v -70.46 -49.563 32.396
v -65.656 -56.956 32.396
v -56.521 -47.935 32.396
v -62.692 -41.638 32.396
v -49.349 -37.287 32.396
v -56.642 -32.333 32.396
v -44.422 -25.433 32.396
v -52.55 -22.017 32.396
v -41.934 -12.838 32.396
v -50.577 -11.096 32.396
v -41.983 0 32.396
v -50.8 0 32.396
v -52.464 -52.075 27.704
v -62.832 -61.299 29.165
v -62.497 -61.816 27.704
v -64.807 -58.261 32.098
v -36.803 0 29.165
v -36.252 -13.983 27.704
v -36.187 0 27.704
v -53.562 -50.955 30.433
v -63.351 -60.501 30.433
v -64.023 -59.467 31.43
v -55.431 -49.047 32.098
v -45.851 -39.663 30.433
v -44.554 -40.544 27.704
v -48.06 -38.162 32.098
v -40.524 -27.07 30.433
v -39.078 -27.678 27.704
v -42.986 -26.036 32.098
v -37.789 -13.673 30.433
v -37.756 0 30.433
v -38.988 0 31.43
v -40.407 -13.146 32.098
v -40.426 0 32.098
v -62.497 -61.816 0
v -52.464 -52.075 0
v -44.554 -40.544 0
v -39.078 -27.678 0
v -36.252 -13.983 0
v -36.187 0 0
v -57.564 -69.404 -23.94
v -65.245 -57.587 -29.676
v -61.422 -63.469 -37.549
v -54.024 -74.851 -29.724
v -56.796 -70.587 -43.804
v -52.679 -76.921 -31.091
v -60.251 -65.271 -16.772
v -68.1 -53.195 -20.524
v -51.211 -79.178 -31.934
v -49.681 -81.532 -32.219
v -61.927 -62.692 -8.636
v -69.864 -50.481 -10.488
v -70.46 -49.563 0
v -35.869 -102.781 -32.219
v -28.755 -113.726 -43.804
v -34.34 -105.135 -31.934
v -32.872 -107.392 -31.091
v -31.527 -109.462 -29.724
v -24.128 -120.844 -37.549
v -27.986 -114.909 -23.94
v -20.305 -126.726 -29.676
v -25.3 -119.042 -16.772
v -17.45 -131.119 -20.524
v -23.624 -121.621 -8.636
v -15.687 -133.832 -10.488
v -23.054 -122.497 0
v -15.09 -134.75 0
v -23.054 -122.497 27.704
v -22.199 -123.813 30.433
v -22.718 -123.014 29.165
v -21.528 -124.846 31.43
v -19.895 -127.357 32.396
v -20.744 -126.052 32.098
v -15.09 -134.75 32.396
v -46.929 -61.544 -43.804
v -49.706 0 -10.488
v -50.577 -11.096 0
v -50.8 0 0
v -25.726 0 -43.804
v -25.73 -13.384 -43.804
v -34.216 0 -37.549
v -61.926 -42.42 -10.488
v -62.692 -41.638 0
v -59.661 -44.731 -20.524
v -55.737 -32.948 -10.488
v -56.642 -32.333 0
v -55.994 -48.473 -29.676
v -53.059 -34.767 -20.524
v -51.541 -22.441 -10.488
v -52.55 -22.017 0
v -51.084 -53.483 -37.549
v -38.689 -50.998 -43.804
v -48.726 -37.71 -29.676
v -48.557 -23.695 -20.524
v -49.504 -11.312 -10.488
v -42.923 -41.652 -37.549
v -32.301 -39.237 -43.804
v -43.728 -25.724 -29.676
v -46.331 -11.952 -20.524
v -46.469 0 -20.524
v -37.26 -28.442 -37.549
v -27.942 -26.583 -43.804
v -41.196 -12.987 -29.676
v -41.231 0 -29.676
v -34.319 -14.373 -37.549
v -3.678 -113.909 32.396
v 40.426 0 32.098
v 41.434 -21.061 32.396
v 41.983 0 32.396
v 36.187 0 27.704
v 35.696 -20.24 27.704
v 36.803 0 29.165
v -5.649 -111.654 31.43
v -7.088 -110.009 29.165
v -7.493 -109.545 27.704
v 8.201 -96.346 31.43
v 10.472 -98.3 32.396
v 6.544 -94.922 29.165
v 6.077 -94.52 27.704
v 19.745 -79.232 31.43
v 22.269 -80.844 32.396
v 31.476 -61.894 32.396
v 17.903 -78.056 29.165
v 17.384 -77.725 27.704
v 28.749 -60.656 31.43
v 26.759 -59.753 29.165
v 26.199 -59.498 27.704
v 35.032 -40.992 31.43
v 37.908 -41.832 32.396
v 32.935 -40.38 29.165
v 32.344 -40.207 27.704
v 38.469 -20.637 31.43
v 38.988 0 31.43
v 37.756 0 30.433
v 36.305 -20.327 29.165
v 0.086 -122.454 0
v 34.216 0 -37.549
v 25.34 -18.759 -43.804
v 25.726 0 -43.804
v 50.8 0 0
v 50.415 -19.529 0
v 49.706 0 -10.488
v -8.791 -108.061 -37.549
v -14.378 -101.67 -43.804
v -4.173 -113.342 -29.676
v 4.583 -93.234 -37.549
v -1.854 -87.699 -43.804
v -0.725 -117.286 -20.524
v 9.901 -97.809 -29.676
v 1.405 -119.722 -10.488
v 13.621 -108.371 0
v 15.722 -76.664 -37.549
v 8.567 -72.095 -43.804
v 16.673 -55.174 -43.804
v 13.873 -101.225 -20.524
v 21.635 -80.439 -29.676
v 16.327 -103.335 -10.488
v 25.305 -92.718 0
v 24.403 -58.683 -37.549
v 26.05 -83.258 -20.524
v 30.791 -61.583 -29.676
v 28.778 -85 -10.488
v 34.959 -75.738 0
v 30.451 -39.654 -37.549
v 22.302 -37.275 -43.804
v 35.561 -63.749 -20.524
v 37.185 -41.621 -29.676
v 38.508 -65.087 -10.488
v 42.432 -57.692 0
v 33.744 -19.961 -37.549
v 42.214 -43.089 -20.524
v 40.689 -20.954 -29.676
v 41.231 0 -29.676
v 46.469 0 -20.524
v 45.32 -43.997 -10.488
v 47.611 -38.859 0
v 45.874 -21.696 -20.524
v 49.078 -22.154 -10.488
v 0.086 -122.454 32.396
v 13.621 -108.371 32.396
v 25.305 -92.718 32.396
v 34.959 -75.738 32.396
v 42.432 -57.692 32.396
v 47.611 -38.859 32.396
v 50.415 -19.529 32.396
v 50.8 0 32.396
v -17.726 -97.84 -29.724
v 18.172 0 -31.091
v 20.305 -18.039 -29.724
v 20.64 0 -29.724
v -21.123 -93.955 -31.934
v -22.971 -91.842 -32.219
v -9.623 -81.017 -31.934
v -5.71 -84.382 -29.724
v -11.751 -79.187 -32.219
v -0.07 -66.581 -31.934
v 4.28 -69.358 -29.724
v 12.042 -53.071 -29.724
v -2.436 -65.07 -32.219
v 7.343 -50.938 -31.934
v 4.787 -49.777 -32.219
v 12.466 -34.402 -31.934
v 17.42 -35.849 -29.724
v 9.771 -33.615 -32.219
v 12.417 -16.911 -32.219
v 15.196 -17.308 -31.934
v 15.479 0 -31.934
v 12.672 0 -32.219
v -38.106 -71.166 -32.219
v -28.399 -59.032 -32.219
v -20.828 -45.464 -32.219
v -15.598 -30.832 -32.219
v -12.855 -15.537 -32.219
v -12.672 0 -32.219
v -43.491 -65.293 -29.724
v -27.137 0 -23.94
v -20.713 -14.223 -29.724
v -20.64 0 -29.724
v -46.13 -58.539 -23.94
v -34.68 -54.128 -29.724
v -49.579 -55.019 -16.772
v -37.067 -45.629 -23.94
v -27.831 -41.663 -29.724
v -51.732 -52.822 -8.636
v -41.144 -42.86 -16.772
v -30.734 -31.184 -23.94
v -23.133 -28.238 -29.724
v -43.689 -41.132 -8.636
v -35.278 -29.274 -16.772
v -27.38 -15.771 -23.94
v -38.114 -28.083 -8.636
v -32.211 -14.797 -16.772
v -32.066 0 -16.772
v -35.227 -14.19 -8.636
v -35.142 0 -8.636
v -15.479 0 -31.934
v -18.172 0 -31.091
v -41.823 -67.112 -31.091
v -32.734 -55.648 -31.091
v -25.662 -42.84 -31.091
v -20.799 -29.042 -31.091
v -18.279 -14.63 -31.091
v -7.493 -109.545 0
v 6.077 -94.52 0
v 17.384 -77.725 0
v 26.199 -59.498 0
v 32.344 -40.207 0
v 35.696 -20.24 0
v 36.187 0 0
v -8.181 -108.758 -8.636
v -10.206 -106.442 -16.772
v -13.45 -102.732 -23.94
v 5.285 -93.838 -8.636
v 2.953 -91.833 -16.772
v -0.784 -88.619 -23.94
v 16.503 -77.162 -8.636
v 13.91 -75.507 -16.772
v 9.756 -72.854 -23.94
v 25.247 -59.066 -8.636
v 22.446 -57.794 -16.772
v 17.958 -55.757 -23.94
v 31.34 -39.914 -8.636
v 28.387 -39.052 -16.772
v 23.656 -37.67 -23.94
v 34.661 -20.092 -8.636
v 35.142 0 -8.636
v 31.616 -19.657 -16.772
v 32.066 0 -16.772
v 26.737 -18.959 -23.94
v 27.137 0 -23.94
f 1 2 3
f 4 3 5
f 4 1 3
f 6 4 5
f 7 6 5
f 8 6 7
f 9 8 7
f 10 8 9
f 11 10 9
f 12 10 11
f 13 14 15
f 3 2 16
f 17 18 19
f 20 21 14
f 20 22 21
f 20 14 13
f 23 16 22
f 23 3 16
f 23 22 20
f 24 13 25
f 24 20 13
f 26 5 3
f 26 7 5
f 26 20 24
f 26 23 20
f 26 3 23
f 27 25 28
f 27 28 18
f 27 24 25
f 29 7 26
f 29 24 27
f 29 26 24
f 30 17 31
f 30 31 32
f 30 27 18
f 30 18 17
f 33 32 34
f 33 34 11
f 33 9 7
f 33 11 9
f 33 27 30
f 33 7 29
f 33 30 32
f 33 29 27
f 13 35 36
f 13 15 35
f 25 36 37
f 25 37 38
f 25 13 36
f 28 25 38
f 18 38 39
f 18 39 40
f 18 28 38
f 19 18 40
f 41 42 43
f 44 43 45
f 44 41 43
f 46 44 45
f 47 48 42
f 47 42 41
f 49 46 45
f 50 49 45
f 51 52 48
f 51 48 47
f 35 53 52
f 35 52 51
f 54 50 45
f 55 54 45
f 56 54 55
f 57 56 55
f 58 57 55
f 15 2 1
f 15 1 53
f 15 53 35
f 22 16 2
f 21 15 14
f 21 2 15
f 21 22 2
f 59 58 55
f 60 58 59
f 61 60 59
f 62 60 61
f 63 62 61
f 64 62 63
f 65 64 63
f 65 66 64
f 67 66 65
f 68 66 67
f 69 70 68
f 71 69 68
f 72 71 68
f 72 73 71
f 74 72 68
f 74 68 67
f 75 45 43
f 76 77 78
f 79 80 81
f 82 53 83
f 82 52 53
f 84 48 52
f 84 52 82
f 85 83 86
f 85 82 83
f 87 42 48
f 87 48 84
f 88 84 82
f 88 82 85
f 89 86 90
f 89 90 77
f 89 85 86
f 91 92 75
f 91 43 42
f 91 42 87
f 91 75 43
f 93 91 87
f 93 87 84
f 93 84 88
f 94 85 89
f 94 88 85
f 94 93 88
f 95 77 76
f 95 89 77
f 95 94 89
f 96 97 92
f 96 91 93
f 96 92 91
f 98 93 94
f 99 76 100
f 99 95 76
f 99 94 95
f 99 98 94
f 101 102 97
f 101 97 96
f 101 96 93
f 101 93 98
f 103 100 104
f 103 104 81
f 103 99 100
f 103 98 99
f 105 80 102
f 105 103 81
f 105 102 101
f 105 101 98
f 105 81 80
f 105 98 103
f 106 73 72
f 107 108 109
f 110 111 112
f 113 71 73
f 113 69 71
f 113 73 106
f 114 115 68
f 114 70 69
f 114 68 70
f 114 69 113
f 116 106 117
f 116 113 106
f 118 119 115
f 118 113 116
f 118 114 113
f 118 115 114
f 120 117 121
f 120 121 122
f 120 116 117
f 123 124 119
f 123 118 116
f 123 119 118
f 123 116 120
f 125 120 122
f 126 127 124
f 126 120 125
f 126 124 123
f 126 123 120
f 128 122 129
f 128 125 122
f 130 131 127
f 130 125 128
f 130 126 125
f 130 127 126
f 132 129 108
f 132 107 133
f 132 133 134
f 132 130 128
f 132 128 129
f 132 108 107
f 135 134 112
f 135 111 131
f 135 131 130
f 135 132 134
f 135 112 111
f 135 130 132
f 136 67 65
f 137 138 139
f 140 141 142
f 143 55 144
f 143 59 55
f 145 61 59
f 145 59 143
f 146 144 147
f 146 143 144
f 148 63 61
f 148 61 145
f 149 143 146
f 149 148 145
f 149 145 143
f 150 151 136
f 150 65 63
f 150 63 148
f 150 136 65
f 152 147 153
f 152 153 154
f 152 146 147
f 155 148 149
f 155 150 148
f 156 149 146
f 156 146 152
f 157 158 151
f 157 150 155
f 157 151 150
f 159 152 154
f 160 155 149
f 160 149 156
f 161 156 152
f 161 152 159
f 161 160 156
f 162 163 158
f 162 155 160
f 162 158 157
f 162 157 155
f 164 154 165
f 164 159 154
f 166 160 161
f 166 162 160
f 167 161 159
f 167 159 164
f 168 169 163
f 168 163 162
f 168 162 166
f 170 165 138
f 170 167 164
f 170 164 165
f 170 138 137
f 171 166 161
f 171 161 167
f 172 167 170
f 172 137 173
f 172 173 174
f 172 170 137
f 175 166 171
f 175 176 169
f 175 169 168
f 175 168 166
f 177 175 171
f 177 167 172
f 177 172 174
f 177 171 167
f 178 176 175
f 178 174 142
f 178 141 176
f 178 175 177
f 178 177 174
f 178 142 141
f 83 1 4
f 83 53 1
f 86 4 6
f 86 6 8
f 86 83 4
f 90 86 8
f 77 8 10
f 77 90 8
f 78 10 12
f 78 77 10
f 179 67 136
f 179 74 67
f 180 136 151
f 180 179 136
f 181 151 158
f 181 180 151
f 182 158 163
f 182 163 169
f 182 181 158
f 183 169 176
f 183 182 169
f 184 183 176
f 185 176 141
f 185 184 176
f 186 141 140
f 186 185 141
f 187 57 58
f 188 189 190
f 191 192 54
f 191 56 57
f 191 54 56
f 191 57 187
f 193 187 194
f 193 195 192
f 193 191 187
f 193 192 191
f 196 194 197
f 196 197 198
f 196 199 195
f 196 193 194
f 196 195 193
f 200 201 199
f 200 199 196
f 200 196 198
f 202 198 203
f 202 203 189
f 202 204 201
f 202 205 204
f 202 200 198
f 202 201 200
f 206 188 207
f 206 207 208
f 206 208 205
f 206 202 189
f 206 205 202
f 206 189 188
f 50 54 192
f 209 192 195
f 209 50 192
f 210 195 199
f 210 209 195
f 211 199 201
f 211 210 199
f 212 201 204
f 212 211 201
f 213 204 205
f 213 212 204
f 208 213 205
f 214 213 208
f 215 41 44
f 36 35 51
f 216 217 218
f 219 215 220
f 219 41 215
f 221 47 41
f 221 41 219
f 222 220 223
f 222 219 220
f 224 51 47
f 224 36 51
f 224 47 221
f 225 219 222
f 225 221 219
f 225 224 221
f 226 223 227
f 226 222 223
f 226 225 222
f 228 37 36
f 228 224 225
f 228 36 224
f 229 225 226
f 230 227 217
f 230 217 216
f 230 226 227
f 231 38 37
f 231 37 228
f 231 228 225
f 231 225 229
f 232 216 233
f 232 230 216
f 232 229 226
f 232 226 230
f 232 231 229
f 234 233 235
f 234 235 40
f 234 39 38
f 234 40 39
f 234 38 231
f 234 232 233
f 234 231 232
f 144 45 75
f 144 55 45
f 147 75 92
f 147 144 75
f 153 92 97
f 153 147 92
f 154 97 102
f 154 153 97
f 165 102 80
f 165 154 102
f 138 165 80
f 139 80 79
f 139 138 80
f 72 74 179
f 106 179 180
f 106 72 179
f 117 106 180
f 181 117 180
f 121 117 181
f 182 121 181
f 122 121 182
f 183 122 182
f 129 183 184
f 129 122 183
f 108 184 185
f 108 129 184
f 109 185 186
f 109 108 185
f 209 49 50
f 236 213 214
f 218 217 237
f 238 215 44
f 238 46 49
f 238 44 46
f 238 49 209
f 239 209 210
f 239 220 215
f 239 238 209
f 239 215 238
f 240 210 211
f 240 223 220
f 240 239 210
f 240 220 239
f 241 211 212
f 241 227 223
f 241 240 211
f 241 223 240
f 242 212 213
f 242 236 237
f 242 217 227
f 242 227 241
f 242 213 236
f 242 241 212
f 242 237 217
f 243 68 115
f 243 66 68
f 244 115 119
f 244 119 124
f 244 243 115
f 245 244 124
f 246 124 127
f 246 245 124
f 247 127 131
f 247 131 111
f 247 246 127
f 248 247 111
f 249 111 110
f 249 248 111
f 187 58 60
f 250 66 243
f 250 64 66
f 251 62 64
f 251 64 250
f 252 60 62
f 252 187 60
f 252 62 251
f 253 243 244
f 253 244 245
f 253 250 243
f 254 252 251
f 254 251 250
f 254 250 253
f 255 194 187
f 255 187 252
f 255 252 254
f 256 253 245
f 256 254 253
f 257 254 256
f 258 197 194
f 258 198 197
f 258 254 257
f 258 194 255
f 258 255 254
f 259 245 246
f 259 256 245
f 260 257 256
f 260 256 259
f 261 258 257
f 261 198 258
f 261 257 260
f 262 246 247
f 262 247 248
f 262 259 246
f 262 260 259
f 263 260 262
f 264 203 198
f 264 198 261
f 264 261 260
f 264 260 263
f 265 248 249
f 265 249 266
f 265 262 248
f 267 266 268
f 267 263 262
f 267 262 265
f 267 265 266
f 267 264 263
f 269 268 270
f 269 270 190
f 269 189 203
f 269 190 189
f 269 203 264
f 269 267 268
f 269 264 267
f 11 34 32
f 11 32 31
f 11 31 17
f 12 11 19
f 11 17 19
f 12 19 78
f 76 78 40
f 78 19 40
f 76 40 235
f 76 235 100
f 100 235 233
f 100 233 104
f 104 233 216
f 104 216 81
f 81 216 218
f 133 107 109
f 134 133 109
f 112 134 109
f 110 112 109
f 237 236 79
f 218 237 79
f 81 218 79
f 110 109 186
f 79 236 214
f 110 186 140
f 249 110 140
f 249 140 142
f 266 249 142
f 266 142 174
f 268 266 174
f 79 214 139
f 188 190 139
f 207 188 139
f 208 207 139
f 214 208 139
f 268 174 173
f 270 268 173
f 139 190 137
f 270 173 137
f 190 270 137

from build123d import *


with BuildPart() as f2:
    # F2: sweep along a path in F1
    with BuildLine(Plane.XY) as f2_path:
        ThreePointArc((-42.775339, -92.156554), (-9.690307, -51.507719), (0, 0))
    # F0 (on Front) → F2 (sweep)
    with BuildSketch(Plane.XZ):
        with BuildLine():
            ThreePointArc((-20.63977, -29.72378), (-32.065525, -16.772159), (-36.187058, 0))
            Line((-36.187058, 0), (-36.187058, 27.704396))
            ThreePointArc((-36.187058, 27.704396), (-38.341088, 30.969492), (-41.983402, 32.395763))
            Line((-41.983402, 32.395763), (-50.8, 32.395763))
            Line((-50.8, 32.395763), (-50.8, 0))
            ThreePointArc((-50.8, 0), (-44.088108, -25.236456), (-25.726035, -43.804237))
            Line((-25.726035, -43.804237), (0, -43.804237))
            Line((0, -43.804237), (25.726035, -43.804237))
            ThreePointArc((25.726035, -43.804237), (44.088108, -25.236456), (50.8, 0))
            Line((50.8, 0), (50.8, 32.395763))
            Line((50.8, 32.395763), (41.983402, 32.395763))
            ThreePointArc((41.983402, 32.395763), (38.341088, 30.969492), (36.187058, 27.704396))
            Line((36.187058, 27.704396), (36.187058, 0))
            ThreePointArc((36.187058, 0), (32.065525, -16.772159), (20.63977, -29.72378))
            ThreePointArc((20.63977, -29.72378), (16.846551, -31.580554), (12.671795, -32.218926))
            Line((12.671795, -32.218926), (0, -32.218926))
            Line((0, -32.218926), (-12.671795, -32.218926))
            ThreePointArc((-12.671795, -32.218926), (-16.846551, -31.580554), (-20.63977, -29.72378))
        make_face()
    sweep(path=f2_path.line)


solid = f2.part
